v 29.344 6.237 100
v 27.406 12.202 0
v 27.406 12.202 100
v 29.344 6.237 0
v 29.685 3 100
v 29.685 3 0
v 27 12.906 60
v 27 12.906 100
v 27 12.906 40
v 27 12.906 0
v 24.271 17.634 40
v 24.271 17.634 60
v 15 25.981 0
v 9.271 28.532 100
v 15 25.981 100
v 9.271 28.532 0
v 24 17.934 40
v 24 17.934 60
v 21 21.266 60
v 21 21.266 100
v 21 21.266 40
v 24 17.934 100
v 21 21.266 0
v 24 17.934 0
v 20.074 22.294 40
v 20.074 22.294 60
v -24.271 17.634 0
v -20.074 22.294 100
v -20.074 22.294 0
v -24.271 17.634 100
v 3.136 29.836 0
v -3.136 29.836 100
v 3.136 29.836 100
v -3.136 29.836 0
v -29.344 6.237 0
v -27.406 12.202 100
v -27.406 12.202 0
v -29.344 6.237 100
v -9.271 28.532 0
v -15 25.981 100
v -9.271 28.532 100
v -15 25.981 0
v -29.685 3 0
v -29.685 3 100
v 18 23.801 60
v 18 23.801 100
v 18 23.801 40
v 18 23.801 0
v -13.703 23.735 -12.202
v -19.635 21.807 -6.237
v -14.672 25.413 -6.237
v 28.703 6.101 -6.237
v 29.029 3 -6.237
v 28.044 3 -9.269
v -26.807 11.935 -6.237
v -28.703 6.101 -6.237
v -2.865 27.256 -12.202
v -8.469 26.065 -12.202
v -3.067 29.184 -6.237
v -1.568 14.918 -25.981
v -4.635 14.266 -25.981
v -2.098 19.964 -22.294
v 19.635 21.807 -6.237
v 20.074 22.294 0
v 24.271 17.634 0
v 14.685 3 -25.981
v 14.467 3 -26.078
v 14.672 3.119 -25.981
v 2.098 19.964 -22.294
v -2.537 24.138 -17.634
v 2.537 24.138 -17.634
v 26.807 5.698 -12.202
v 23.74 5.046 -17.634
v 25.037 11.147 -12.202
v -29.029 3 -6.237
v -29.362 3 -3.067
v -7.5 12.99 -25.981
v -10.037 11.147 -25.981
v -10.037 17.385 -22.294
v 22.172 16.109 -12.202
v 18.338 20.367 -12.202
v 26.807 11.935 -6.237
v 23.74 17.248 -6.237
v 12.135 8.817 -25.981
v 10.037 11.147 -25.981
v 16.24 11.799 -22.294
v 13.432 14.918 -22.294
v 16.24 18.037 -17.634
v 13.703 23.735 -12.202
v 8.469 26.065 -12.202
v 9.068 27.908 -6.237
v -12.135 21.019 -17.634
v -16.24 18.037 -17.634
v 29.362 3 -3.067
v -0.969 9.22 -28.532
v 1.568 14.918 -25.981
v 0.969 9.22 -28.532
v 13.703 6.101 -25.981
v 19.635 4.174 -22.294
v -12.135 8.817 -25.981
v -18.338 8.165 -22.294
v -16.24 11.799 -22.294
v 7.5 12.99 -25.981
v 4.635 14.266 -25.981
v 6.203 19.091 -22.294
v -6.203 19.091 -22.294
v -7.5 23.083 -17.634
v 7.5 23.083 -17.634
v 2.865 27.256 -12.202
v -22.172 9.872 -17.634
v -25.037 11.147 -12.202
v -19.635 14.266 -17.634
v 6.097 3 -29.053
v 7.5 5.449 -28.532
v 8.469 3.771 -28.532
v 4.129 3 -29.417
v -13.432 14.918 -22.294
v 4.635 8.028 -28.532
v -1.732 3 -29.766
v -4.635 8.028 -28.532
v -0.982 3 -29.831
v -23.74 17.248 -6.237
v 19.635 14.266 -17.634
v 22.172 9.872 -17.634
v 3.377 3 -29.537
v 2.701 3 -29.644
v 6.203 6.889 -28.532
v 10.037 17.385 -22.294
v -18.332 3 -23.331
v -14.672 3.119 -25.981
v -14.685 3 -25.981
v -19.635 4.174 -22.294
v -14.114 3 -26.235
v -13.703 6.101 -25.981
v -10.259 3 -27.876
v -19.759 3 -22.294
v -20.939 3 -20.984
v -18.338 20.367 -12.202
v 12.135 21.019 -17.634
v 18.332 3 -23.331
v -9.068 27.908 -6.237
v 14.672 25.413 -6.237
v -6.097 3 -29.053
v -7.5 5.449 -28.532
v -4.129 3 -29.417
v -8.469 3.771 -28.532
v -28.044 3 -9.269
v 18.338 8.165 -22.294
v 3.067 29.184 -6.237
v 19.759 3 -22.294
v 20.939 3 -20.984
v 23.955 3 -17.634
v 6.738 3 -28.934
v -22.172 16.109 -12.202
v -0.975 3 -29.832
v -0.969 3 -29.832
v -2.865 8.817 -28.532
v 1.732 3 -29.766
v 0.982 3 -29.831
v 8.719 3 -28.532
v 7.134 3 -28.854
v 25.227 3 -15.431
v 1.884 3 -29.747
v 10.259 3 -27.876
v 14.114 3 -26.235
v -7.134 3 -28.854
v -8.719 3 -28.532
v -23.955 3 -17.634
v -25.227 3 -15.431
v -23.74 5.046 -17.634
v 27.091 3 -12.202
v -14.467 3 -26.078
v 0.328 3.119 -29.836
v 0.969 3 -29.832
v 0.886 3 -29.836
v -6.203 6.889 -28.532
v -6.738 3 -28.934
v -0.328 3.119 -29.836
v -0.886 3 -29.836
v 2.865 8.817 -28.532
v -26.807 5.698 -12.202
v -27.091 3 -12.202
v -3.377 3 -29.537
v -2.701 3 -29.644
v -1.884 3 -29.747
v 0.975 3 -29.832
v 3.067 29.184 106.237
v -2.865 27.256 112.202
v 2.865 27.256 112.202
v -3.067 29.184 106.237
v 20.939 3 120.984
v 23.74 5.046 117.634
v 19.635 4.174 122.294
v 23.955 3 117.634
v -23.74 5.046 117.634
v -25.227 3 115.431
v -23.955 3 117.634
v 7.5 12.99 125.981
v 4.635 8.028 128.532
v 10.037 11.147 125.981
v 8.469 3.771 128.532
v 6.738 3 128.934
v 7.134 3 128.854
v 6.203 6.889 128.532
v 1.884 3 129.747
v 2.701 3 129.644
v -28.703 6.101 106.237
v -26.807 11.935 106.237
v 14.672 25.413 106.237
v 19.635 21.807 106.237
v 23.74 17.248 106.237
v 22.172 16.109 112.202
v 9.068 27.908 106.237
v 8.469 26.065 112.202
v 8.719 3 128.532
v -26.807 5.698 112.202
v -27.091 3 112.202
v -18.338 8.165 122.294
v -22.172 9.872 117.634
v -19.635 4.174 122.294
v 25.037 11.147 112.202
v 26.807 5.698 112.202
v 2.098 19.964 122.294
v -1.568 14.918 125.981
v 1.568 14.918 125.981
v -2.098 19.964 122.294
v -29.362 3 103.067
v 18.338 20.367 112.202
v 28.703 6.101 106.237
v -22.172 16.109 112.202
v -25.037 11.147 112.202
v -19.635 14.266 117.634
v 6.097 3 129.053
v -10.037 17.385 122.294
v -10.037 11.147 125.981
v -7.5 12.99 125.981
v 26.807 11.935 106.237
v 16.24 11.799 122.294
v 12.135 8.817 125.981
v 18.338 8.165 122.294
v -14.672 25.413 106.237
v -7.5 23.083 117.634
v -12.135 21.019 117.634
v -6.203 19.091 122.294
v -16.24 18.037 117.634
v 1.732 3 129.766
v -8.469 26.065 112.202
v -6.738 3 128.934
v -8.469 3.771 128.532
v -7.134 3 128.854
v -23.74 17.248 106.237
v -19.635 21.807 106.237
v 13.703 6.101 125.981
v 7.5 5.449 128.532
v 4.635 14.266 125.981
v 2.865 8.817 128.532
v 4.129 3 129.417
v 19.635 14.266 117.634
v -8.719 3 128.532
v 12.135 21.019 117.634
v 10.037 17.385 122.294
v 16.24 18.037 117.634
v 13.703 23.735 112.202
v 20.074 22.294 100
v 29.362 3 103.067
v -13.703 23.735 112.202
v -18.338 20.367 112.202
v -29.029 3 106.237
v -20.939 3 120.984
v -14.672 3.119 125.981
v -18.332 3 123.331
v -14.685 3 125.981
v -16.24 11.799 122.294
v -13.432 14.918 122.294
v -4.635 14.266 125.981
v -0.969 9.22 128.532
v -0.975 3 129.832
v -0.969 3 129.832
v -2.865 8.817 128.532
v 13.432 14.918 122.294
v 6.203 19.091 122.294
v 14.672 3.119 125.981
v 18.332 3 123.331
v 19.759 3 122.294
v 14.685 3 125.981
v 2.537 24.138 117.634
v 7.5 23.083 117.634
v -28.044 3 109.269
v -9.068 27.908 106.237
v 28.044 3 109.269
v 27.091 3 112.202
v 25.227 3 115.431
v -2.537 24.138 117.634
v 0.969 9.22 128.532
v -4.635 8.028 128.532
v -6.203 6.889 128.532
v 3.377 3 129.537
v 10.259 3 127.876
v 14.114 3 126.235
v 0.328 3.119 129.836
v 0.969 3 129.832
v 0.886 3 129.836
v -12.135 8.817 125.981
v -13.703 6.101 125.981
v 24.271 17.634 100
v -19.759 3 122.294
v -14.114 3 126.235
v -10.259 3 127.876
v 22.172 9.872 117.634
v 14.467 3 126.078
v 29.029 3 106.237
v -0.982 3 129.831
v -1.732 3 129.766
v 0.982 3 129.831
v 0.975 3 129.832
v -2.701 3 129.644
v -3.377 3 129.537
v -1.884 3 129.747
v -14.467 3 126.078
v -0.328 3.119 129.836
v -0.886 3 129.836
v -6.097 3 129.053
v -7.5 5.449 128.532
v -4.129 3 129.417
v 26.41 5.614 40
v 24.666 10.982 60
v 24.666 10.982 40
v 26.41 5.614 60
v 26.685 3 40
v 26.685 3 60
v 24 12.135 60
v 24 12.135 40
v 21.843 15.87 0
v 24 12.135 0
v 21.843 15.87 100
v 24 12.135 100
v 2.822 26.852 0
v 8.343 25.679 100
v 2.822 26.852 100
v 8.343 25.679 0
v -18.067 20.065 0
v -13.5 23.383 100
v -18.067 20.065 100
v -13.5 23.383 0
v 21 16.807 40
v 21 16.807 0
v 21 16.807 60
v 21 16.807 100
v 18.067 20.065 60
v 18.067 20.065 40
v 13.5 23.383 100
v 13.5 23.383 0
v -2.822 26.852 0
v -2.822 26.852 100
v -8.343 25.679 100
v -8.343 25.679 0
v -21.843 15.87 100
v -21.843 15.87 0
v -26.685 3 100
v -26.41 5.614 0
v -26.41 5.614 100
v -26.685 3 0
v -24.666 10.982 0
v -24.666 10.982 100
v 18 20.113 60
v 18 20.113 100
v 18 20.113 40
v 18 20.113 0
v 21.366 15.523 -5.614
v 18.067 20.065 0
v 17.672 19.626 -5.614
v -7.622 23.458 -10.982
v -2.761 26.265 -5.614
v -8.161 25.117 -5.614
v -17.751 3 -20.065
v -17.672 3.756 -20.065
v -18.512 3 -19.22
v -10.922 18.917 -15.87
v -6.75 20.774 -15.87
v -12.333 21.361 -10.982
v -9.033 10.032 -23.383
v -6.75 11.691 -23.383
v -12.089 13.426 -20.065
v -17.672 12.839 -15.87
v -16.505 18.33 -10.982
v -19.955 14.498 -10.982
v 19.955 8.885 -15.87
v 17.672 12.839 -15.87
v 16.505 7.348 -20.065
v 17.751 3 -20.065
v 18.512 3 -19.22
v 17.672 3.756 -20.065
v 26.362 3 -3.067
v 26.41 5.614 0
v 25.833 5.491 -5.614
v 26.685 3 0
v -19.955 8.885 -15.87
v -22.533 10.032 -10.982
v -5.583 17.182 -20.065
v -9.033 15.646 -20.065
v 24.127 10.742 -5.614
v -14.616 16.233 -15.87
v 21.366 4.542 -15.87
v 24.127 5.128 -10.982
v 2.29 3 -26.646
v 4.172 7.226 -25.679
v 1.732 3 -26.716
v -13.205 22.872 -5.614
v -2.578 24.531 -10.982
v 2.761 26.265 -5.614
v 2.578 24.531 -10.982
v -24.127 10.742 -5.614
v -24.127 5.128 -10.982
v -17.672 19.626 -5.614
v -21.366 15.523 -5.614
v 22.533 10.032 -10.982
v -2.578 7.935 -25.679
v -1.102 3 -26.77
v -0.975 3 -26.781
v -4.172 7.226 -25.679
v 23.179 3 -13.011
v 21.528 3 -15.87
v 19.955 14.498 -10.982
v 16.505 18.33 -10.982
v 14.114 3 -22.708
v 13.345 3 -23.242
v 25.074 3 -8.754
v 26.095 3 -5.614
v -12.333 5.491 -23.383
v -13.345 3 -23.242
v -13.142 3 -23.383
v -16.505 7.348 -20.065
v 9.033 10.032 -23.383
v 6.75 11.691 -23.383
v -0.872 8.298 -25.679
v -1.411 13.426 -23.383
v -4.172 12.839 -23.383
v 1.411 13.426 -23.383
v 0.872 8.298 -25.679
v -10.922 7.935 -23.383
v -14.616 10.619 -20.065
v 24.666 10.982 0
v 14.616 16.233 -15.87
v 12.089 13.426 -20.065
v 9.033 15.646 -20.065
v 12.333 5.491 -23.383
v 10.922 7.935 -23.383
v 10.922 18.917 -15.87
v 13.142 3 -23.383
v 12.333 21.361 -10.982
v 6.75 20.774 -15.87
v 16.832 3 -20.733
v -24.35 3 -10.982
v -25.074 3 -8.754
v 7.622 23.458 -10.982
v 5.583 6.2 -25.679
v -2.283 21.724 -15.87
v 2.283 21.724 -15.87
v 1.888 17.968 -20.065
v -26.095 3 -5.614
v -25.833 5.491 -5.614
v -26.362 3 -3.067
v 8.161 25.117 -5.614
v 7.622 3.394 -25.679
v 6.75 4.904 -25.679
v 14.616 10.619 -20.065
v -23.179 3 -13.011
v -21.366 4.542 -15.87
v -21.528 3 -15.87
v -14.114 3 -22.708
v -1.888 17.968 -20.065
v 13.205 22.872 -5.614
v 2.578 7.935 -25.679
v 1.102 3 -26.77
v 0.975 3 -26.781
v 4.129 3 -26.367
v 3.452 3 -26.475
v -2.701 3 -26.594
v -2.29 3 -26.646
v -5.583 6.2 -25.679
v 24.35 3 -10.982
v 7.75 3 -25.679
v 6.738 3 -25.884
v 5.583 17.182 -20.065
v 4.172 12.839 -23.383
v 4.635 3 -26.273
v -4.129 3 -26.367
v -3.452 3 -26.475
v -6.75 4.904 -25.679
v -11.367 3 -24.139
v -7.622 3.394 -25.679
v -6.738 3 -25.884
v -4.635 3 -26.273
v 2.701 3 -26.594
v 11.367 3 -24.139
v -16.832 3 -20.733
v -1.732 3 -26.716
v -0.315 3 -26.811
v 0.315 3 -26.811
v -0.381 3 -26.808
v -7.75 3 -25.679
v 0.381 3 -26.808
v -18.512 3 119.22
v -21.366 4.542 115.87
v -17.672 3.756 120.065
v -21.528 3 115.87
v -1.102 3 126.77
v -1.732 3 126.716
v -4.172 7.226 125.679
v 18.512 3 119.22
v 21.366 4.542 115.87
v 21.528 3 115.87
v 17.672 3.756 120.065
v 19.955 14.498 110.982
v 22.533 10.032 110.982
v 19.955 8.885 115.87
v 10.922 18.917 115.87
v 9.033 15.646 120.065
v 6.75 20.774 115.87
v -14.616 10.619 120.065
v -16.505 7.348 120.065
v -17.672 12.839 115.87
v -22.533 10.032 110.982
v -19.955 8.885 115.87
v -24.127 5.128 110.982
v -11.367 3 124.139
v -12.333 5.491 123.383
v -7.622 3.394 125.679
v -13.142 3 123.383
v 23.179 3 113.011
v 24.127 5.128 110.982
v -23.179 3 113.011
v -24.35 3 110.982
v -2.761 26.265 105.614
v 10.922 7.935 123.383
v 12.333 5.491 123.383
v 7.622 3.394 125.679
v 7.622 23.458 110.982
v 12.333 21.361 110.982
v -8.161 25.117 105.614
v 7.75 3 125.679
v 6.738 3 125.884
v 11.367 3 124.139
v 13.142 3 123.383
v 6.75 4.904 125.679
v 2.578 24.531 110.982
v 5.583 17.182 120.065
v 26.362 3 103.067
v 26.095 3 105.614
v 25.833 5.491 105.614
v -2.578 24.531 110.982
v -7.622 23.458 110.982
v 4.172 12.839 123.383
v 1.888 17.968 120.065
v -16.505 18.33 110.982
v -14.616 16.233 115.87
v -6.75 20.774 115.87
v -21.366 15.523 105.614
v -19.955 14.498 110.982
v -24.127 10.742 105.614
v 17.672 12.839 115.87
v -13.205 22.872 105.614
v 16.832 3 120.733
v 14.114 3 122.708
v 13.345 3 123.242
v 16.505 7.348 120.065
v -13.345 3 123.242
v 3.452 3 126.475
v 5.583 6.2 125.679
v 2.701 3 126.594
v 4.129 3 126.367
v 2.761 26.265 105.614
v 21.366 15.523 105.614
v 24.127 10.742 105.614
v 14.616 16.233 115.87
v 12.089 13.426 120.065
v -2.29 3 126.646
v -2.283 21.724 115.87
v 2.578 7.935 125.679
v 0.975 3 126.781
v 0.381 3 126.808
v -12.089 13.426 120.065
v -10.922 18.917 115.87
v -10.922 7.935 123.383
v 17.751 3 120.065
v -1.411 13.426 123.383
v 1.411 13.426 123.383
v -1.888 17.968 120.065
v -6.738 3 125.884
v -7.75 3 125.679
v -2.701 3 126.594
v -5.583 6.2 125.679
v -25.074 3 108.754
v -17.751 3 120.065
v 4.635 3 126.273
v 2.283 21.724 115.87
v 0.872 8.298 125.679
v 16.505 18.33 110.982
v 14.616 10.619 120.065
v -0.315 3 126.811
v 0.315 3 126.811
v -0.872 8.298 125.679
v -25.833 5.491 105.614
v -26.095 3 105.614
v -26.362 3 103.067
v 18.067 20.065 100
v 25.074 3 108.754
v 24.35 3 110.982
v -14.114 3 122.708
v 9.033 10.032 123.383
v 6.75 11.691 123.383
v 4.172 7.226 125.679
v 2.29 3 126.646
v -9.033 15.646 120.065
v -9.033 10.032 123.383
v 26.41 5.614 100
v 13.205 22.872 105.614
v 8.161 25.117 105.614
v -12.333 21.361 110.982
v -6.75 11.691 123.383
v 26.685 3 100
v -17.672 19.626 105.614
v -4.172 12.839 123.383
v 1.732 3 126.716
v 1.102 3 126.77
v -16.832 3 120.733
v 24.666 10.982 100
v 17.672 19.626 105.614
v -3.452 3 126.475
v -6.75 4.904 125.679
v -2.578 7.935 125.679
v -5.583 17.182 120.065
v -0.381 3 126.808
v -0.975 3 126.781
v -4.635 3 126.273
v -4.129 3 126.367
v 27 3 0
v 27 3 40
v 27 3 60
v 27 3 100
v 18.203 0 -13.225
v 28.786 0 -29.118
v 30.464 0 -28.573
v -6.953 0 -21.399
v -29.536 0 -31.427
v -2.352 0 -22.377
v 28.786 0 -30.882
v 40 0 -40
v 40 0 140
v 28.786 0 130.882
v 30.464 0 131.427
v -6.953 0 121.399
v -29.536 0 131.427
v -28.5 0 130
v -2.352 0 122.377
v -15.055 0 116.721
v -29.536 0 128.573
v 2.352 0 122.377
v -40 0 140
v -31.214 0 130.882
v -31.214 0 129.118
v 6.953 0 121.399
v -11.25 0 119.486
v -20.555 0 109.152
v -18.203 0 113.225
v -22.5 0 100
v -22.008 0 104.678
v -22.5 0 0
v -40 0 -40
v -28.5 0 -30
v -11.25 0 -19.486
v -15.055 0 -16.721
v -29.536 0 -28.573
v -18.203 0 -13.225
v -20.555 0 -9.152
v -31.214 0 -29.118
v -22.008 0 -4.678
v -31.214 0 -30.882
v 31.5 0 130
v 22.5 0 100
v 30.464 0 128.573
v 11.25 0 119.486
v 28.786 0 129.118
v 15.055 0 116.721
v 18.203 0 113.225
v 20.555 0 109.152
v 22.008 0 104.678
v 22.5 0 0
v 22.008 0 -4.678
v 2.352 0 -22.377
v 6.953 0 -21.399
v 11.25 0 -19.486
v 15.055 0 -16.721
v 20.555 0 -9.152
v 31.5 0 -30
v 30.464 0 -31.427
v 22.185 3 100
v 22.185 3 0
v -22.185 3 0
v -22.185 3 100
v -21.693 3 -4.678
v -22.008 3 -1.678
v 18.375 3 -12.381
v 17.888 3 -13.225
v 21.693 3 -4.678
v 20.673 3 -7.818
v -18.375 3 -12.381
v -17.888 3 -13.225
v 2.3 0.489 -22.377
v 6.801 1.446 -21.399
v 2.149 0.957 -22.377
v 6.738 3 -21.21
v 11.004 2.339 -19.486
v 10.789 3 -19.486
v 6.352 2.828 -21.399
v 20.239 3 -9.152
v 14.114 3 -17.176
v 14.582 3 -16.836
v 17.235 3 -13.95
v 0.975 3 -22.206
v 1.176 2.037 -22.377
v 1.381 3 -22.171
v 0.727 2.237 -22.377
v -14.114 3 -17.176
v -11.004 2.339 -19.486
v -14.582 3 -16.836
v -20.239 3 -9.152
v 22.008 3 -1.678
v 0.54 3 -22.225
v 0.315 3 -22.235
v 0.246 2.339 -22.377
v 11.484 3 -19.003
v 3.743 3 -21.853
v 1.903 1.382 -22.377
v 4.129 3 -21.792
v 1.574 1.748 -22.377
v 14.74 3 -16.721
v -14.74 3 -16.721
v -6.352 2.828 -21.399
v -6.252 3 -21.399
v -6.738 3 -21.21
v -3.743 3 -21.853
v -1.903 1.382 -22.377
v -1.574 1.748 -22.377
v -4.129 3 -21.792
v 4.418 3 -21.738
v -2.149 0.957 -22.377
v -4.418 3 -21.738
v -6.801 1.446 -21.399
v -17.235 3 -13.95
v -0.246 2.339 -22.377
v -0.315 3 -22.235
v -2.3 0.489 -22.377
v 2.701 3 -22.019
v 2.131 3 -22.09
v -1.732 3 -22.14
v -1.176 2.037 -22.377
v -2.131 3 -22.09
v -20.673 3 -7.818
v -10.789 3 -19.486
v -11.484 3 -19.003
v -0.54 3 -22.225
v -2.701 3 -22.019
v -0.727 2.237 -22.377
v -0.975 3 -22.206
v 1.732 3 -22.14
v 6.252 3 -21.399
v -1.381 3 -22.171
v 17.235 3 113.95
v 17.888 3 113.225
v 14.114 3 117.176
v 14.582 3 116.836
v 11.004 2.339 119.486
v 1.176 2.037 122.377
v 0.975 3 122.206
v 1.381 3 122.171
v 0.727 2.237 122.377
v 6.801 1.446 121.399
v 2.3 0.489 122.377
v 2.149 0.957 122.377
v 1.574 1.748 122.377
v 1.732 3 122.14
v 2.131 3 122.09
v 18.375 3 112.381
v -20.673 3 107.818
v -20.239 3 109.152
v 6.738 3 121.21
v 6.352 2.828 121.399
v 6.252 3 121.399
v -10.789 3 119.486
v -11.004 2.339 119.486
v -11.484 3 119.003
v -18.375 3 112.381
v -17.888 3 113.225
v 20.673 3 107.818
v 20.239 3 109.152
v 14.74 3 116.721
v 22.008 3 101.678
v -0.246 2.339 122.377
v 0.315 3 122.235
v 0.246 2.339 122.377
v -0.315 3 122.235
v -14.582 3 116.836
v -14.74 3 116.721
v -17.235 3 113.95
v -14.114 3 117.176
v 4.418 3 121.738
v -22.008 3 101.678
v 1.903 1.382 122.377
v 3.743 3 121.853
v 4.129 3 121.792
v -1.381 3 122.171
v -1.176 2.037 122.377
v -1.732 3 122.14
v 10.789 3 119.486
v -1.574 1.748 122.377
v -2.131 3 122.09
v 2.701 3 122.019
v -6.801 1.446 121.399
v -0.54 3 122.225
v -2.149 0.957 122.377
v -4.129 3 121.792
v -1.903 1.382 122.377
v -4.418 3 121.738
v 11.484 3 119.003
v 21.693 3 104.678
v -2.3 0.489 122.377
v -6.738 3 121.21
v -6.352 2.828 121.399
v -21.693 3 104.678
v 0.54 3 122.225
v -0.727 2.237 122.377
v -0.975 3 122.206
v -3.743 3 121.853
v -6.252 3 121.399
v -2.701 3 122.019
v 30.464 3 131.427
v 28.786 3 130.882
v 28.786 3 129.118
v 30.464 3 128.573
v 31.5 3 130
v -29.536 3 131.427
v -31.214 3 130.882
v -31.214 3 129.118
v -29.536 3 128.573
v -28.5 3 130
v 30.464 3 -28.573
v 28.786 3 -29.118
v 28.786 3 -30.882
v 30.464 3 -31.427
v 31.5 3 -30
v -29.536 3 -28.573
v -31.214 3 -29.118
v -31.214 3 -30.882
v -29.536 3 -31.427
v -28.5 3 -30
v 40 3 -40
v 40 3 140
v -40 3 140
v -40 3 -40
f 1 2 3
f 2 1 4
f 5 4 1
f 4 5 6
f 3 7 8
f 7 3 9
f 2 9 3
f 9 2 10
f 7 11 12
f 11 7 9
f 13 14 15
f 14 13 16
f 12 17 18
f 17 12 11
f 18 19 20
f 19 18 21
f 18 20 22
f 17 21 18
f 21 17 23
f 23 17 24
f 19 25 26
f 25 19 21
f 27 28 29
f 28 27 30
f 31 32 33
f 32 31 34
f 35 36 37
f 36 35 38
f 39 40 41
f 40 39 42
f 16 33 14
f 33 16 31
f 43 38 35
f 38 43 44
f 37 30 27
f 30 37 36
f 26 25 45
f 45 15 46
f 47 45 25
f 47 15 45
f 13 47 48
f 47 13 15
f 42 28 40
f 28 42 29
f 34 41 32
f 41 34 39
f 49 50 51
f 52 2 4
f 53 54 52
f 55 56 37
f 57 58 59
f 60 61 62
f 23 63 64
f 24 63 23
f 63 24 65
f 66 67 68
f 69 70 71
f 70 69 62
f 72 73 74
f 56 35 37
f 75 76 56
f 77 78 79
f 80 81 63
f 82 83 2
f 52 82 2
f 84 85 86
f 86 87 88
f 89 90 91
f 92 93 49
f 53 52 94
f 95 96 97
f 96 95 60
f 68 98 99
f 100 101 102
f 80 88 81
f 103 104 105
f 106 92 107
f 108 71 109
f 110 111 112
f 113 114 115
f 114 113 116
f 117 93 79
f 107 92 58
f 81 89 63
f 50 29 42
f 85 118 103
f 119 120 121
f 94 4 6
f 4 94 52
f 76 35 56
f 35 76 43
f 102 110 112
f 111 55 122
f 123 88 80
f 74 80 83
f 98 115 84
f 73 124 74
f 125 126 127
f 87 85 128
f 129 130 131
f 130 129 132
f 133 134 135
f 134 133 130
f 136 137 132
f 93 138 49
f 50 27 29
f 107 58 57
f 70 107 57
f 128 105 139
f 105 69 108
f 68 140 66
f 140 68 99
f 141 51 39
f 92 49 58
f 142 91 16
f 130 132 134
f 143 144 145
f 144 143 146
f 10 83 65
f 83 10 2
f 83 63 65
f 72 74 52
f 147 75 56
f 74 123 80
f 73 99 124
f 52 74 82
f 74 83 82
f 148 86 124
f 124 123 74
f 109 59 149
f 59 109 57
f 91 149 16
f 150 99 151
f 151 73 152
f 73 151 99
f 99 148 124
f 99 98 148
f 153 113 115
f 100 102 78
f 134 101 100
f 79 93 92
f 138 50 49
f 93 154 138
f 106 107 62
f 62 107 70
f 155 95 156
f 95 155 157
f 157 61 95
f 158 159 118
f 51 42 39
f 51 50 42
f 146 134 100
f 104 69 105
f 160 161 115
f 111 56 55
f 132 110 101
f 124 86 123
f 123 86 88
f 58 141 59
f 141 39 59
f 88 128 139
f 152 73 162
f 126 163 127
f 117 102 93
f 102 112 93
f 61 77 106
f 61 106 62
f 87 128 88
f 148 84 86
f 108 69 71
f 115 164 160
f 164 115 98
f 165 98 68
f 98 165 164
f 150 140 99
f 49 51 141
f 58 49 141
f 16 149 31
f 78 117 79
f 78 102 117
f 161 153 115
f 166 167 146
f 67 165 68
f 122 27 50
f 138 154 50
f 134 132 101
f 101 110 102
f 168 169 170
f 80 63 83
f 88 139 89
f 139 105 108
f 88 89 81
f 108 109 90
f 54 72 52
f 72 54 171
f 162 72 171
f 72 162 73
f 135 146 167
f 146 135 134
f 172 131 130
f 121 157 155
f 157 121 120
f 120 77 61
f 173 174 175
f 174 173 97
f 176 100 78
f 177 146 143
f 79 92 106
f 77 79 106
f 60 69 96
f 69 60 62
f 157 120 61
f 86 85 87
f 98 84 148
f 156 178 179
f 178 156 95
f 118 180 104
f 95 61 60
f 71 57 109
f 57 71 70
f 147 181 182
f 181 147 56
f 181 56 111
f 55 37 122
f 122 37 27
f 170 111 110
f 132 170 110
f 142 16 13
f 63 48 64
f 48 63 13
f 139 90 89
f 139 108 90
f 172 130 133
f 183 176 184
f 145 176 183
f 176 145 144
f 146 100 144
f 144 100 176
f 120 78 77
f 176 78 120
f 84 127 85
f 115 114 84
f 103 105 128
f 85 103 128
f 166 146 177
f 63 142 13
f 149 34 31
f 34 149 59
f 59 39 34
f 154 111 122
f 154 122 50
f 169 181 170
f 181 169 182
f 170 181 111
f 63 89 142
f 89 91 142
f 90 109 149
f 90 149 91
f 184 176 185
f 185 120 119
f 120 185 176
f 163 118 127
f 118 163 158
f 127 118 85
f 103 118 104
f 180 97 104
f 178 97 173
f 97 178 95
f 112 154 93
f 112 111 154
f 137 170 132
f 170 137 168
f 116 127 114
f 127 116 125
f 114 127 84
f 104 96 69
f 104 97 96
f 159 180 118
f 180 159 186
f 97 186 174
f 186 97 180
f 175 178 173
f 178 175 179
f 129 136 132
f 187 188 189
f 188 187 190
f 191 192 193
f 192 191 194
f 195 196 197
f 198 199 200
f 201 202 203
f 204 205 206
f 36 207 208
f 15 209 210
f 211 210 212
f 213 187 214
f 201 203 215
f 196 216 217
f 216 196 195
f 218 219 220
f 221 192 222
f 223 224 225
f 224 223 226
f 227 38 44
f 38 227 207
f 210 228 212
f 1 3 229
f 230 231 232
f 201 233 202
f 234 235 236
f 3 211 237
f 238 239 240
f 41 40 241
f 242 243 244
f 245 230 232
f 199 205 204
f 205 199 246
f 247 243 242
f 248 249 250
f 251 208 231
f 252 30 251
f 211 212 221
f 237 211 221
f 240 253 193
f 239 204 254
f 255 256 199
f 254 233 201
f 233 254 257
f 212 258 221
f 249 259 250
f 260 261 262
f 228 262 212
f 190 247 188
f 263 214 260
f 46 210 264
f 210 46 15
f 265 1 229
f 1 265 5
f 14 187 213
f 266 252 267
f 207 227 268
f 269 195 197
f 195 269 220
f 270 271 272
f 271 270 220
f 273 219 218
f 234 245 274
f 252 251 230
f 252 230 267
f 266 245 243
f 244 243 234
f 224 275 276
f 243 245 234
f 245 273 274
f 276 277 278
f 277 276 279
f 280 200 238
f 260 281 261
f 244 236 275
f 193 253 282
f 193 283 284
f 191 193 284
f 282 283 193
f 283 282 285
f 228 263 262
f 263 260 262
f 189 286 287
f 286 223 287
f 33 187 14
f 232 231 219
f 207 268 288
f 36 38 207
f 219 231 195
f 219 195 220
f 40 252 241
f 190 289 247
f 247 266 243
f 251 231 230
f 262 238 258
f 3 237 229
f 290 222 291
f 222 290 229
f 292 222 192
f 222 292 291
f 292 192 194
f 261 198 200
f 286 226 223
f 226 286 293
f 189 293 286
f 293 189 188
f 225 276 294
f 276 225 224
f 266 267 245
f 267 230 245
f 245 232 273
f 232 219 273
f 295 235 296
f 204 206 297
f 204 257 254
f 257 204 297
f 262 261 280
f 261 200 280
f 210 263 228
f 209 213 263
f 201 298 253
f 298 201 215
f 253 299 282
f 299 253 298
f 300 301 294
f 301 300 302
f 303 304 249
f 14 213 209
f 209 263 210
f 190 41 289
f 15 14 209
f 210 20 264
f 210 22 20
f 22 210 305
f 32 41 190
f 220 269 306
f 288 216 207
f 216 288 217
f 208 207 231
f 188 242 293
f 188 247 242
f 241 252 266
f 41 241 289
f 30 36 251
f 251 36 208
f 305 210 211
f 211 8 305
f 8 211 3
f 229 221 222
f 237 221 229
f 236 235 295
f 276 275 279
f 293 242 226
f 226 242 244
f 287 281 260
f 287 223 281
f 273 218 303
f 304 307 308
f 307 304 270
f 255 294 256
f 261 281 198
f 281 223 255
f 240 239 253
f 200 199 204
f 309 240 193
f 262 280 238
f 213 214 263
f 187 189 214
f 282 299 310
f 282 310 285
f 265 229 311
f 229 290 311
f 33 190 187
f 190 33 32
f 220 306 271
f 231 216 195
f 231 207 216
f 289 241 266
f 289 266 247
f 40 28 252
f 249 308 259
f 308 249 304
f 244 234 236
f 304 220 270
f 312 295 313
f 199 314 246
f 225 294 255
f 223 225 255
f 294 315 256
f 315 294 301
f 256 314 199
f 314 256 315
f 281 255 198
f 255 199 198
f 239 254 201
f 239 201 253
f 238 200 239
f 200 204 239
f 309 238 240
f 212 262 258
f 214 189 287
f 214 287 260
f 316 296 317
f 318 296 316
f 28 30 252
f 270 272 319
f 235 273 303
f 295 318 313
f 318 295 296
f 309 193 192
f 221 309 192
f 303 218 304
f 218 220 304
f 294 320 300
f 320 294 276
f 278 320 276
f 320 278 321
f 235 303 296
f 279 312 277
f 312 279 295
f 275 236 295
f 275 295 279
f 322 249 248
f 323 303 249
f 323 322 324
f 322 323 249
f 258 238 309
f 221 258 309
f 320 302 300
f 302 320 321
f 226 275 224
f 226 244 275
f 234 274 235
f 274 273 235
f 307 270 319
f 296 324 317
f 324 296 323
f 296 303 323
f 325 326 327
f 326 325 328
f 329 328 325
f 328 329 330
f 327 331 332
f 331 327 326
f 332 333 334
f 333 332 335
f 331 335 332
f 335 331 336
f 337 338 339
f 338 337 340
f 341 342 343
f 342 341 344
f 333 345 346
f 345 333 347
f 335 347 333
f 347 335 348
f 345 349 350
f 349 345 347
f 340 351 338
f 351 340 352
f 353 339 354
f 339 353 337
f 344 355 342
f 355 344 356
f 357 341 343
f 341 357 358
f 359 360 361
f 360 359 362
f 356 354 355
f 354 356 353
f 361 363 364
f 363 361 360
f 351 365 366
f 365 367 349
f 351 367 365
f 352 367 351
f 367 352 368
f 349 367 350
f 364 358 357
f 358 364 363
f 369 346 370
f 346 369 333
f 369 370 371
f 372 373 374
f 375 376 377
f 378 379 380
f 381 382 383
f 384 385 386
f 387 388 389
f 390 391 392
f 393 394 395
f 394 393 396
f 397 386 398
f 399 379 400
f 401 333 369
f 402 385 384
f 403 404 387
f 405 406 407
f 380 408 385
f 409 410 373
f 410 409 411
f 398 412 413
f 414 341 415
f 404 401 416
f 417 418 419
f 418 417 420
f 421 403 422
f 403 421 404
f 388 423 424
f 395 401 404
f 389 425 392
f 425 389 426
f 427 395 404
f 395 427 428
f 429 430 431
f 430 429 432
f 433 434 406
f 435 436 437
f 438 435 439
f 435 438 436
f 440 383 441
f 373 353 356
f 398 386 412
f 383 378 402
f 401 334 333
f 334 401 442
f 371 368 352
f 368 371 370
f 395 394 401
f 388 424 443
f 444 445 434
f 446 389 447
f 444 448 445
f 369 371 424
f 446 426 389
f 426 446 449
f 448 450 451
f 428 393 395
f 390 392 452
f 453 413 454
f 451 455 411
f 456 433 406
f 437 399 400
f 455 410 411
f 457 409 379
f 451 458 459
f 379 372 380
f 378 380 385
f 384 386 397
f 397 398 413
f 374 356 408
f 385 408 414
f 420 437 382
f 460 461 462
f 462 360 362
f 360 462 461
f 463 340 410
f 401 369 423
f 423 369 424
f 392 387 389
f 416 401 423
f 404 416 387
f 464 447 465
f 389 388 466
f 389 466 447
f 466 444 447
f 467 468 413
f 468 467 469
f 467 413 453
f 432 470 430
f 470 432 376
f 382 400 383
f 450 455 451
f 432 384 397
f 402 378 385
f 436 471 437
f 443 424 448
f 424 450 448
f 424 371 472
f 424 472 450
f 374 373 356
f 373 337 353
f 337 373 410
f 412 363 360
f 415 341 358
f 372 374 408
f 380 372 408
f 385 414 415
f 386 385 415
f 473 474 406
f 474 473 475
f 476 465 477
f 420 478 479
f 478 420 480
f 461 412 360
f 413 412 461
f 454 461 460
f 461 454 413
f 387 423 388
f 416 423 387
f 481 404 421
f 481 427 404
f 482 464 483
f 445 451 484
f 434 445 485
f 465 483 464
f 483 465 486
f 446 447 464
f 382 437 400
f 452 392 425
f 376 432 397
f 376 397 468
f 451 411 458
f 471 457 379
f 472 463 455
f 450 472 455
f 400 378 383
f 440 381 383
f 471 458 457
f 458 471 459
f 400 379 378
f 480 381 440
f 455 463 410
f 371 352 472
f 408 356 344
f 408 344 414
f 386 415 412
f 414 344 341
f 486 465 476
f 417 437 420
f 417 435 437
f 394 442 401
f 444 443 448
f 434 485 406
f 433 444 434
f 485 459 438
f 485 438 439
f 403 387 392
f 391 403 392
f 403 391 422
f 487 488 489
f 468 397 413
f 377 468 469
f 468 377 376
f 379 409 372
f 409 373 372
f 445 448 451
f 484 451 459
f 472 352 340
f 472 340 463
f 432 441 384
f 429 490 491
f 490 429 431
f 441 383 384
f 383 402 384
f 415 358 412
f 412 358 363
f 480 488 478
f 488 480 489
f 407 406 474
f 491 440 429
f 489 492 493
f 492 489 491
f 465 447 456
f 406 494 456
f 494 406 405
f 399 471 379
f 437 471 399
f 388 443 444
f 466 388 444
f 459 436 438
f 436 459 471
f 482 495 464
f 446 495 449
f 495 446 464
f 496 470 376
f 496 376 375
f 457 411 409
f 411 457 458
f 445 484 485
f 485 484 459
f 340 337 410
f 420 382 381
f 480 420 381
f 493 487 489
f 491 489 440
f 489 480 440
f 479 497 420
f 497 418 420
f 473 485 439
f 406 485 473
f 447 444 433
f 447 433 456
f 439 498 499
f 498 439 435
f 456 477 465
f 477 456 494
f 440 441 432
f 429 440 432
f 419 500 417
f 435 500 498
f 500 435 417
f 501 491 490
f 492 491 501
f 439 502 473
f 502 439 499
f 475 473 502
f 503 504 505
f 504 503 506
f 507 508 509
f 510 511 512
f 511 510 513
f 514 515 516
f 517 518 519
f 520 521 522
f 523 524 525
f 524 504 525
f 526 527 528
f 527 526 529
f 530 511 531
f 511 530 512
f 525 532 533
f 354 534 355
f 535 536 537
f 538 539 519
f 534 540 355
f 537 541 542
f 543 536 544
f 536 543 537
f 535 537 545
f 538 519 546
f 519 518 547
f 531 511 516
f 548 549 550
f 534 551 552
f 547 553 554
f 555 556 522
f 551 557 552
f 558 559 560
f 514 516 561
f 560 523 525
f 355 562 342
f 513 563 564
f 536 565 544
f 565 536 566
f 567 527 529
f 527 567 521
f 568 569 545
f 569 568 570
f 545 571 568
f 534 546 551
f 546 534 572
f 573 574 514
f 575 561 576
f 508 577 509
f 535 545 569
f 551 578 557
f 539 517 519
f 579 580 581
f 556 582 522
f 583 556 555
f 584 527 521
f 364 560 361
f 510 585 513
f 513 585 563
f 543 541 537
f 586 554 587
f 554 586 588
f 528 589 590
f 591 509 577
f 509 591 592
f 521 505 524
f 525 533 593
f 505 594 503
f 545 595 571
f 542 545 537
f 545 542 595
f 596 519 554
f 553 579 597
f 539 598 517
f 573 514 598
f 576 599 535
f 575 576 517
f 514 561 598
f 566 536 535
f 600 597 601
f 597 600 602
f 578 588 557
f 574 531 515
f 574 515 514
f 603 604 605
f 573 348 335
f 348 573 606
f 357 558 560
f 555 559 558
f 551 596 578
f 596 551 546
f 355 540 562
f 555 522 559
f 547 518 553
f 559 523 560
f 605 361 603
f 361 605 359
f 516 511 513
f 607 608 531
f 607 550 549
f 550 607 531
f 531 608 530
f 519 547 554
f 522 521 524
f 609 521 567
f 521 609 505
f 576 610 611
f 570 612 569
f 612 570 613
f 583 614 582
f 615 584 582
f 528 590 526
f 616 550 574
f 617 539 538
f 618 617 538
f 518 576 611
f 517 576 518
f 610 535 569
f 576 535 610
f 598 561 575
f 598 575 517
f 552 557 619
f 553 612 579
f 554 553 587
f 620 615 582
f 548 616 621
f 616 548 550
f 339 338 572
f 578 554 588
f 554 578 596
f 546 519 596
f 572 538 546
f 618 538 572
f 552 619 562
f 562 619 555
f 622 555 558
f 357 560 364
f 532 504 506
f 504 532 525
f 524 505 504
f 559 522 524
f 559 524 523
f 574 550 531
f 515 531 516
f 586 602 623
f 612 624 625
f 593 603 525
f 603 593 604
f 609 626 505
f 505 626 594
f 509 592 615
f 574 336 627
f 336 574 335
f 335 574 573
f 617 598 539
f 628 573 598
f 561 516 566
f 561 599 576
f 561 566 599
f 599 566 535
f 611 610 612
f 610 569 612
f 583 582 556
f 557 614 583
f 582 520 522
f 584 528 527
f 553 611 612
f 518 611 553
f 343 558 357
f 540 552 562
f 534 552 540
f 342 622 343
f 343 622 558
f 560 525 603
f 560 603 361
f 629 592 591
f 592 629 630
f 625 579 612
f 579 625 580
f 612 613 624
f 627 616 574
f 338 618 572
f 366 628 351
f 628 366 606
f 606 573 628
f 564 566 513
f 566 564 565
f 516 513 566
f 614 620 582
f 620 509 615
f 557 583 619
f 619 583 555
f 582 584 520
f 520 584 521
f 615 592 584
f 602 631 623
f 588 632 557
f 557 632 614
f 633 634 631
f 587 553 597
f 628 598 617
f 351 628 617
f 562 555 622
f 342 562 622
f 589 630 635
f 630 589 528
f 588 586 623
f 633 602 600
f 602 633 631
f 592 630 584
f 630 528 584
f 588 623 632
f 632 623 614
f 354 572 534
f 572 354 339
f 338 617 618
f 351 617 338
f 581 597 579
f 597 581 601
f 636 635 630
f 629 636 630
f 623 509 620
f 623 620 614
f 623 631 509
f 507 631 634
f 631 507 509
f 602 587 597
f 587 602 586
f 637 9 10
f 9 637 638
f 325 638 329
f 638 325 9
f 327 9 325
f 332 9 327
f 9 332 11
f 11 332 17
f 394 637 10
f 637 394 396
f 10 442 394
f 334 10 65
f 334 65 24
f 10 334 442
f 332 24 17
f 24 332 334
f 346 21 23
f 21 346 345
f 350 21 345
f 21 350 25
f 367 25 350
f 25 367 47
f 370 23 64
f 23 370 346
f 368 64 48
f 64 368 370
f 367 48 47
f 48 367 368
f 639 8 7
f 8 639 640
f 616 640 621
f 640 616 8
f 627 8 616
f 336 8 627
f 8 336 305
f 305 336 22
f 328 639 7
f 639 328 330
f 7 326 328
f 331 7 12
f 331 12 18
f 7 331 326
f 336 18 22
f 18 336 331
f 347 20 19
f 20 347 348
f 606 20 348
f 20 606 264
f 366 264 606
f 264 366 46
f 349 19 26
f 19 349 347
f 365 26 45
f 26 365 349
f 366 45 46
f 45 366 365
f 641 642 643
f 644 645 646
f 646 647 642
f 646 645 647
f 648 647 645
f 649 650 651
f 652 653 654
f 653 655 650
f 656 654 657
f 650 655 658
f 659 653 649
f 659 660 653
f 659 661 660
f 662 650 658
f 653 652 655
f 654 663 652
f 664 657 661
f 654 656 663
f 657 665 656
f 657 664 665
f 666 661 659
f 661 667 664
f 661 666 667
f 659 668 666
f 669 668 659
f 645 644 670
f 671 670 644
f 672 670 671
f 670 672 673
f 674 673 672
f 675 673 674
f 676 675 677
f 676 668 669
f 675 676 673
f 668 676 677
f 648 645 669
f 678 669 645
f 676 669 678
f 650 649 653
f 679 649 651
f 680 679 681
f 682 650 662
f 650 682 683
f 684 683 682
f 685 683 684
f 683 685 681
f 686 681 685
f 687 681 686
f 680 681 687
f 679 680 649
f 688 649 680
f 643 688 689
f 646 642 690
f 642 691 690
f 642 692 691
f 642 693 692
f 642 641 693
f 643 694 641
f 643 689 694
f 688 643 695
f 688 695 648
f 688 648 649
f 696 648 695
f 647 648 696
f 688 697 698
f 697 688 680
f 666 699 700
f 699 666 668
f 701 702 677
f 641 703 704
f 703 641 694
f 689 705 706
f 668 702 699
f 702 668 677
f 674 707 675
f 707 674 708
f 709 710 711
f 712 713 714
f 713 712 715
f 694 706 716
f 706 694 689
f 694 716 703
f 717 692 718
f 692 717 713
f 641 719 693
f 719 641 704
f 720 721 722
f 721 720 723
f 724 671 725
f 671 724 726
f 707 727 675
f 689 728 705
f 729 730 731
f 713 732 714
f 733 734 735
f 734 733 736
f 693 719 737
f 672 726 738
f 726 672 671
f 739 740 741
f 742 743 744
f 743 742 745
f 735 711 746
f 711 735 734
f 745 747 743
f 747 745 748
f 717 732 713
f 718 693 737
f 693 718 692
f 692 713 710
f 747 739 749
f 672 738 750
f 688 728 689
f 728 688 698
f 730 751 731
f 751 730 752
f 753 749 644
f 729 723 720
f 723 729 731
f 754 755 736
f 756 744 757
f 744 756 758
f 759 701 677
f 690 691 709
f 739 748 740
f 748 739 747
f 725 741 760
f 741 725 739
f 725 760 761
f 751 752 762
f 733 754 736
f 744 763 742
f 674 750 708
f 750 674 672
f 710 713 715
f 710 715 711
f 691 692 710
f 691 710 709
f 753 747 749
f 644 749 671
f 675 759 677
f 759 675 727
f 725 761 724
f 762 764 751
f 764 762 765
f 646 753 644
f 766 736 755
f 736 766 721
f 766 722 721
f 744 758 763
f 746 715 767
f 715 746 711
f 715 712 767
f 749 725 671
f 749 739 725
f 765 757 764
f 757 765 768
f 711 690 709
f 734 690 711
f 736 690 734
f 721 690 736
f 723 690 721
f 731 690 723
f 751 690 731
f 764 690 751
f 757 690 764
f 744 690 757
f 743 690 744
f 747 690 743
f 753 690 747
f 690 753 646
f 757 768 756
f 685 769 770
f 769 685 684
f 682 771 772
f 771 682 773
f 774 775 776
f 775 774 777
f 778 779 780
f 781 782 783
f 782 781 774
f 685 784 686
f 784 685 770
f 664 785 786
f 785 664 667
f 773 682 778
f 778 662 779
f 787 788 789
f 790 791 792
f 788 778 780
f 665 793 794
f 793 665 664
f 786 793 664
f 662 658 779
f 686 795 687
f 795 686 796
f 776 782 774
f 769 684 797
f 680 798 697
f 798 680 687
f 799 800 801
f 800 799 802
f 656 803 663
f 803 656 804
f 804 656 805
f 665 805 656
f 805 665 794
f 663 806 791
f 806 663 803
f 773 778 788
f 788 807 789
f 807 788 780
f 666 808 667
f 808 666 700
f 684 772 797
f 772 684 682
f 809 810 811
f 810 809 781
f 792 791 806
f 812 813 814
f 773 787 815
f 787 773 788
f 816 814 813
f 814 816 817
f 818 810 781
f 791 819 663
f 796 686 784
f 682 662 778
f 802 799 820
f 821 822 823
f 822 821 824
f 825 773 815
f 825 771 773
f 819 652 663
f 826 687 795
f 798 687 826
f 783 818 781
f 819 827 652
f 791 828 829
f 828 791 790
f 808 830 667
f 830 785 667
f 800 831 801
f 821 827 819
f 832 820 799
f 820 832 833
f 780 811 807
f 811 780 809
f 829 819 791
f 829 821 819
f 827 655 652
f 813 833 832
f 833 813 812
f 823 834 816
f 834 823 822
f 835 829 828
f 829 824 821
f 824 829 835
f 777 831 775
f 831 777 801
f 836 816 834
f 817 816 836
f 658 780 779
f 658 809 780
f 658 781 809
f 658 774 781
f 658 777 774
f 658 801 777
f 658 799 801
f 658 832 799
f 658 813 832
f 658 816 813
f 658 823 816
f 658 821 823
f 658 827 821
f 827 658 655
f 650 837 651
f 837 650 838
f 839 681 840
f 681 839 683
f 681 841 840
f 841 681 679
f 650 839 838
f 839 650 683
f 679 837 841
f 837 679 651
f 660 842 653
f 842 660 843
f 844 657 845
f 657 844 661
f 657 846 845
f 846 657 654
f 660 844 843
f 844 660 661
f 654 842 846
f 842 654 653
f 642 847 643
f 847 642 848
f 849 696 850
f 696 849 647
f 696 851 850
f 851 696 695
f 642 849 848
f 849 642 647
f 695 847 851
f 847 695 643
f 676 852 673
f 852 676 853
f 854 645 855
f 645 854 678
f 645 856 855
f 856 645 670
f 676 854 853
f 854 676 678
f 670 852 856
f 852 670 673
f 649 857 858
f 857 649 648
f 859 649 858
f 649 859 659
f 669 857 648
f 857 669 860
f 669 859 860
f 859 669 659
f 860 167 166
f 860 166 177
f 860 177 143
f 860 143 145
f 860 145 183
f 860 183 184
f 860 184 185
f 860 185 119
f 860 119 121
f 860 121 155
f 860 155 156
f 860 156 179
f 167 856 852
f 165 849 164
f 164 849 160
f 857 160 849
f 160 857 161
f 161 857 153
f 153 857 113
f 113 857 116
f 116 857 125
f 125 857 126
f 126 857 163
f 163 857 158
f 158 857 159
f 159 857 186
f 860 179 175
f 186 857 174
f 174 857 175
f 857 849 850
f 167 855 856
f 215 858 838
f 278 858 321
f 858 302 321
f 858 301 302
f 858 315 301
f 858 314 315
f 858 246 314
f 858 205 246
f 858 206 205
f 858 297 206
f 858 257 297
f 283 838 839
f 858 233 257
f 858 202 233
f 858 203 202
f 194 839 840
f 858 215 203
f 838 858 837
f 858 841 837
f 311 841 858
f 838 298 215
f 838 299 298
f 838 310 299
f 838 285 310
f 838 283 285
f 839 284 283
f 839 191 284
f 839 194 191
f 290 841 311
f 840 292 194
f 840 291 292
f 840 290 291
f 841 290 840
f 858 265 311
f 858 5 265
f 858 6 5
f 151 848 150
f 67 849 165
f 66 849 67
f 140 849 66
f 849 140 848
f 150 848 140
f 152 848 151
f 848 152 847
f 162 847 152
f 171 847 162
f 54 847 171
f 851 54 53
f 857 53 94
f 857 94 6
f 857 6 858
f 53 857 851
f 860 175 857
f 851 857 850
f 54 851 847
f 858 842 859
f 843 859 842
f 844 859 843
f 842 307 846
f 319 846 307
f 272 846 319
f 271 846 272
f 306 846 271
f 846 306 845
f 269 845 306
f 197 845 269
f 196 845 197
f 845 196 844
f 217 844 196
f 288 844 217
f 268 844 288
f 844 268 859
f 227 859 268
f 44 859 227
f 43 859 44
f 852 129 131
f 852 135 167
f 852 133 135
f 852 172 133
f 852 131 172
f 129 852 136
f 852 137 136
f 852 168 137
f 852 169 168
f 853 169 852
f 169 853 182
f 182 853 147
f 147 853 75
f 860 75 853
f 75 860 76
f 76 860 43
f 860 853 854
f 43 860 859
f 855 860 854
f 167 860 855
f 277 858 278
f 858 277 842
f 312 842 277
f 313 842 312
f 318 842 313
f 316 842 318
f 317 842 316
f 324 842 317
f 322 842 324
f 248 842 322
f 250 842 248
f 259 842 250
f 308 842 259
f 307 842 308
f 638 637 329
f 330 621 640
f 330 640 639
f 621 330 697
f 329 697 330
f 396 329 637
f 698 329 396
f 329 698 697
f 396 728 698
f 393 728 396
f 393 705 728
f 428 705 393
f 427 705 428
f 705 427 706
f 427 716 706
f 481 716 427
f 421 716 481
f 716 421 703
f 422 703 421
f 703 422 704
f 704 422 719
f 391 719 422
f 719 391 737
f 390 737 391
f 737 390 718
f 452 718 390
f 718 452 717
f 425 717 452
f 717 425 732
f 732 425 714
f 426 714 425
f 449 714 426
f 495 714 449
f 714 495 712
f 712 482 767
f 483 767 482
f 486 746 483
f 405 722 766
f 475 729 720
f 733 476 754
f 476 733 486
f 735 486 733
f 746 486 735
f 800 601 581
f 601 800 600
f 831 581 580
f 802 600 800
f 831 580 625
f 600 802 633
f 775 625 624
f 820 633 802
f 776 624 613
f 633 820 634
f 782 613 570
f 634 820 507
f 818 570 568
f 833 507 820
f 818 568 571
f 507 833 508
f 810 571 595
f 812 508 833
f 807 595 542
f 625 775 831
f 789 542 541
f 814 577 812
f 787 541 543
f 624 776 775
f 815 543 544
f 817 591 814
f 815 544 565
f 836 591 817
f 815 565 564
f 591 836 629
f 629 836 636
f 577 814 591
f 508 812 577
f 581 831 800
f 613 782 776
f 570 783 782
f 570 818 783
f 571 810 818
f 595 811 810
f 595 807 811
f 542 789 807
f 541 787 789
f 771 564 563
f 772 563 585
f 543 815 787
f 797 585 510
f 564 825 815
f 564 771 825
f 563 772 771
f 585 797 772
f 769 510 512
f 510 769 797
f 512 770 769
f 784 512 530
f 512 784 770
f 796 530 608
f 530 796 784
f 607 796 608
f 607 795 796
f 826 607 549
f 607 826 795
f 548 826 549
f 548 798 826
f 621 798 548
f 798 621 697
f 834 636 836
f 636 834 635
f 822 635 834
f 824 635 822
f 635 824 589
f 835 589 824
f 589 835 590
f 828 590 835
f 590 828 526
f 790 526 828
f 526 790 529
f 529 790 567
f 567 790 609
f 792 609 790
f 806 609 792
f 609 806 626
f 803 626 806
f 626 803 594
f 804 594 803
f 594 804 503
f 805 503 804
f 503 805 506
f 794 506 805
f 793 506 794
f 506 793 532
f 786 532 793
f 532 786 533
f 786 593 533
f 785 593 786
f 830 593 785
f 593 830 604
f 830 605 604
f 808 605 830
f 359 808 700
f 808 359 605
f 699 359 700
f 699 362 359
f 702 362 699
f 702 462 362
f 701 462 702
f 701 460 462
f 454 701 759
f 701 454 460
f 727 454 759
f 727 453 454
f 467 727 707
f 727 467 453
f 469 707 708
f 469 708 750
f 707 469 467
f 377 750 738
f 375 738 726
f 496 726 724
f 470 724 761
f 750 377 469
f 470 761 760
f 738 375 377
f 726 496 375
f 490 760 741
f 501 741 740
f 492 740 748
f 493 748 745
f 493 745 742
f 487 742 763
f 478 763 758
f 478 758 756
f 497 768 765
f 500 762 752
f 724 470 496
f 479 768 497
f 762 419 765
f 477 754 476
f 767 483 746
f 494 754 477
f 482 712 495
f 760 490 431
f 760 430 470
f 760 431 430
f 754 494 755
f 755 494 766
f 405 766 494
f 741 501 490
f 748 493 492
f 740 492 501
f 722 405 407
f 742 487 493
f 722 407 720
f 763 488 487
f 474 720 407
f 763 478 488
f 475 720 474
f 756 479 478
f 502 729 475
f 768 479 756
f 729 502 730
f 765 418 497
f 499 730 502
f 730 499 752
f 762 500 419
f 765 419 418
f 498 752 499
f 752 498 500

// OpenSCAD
//////////////////////setup
module outdoorcover(){

    cylinder(h=100, r=30);
    
    translate([0,0,0])
    sphere(r = 30);
        
    translate([0,0,100])
    sphere(r = 30);
}   

module indoorcover(){
    scale([0.9,0.9,1])
    cylinder(h=100, r=30);
    
    translate([0,0,0])
    scale([0.9,0.9,0.9])
    sphere(r = 30);
        
    translate([0,0,100])
    scale([0.9,0.9,0.9])
    sphere(r = 30);
}

module subtracthalfcover(){
    translate([-40,-80,-40])
    cube([80, 80, 200]);
}

module vents(){
    translate([24,0,0])
    cube([3,40,40]);
    
    translate([18,0,0])
    cube([3,40,40]);
    
    translate([24,0,60])
    cube([3,40,40]);
    
    translate([18,0,60])
    cube([3,40,40]);
}

module outdoormountingplates(){
    translate([-40,0,-40])
    cube([80,3,180]);
}

module indoormountingplates(){
    scale([0.75,0.75,1])
    cylinder(h=100, r=30);
    
    translate([0,0,0])
    scale([0.75,0.75,0.75])
    sphere(r = 30);
        
    translate([0,0,100])
    scale([0.75,0.75,0.75])
    sphere(r = 30);
}

module screwholes(){
    translate([30,-10,130])
    rotate([-90,0,0])
    cylinder(h = 40, r = 1.5);
    
    translate([-30,-10,130])
    rotate([-90,0,0])
    cylinder(h = 40, r = 1.5);
    
    translate([30,-10,-30])
    rotate([-90,0,0])
    cylinder(h = 40, r = 1.5);
    
    translate([-30,-10,-30])
    rotate([-90,0,0])
    cylinder(h = 40, r = 1.5);
}
//////////////end

//////////////action
difference(){
    outdoorcover();
    indoorcover();
    subtracthalfcover();
    vents();
}

difference(){
    outdoormountingplates();
    indoormountingplates();
    screwholes();

}
